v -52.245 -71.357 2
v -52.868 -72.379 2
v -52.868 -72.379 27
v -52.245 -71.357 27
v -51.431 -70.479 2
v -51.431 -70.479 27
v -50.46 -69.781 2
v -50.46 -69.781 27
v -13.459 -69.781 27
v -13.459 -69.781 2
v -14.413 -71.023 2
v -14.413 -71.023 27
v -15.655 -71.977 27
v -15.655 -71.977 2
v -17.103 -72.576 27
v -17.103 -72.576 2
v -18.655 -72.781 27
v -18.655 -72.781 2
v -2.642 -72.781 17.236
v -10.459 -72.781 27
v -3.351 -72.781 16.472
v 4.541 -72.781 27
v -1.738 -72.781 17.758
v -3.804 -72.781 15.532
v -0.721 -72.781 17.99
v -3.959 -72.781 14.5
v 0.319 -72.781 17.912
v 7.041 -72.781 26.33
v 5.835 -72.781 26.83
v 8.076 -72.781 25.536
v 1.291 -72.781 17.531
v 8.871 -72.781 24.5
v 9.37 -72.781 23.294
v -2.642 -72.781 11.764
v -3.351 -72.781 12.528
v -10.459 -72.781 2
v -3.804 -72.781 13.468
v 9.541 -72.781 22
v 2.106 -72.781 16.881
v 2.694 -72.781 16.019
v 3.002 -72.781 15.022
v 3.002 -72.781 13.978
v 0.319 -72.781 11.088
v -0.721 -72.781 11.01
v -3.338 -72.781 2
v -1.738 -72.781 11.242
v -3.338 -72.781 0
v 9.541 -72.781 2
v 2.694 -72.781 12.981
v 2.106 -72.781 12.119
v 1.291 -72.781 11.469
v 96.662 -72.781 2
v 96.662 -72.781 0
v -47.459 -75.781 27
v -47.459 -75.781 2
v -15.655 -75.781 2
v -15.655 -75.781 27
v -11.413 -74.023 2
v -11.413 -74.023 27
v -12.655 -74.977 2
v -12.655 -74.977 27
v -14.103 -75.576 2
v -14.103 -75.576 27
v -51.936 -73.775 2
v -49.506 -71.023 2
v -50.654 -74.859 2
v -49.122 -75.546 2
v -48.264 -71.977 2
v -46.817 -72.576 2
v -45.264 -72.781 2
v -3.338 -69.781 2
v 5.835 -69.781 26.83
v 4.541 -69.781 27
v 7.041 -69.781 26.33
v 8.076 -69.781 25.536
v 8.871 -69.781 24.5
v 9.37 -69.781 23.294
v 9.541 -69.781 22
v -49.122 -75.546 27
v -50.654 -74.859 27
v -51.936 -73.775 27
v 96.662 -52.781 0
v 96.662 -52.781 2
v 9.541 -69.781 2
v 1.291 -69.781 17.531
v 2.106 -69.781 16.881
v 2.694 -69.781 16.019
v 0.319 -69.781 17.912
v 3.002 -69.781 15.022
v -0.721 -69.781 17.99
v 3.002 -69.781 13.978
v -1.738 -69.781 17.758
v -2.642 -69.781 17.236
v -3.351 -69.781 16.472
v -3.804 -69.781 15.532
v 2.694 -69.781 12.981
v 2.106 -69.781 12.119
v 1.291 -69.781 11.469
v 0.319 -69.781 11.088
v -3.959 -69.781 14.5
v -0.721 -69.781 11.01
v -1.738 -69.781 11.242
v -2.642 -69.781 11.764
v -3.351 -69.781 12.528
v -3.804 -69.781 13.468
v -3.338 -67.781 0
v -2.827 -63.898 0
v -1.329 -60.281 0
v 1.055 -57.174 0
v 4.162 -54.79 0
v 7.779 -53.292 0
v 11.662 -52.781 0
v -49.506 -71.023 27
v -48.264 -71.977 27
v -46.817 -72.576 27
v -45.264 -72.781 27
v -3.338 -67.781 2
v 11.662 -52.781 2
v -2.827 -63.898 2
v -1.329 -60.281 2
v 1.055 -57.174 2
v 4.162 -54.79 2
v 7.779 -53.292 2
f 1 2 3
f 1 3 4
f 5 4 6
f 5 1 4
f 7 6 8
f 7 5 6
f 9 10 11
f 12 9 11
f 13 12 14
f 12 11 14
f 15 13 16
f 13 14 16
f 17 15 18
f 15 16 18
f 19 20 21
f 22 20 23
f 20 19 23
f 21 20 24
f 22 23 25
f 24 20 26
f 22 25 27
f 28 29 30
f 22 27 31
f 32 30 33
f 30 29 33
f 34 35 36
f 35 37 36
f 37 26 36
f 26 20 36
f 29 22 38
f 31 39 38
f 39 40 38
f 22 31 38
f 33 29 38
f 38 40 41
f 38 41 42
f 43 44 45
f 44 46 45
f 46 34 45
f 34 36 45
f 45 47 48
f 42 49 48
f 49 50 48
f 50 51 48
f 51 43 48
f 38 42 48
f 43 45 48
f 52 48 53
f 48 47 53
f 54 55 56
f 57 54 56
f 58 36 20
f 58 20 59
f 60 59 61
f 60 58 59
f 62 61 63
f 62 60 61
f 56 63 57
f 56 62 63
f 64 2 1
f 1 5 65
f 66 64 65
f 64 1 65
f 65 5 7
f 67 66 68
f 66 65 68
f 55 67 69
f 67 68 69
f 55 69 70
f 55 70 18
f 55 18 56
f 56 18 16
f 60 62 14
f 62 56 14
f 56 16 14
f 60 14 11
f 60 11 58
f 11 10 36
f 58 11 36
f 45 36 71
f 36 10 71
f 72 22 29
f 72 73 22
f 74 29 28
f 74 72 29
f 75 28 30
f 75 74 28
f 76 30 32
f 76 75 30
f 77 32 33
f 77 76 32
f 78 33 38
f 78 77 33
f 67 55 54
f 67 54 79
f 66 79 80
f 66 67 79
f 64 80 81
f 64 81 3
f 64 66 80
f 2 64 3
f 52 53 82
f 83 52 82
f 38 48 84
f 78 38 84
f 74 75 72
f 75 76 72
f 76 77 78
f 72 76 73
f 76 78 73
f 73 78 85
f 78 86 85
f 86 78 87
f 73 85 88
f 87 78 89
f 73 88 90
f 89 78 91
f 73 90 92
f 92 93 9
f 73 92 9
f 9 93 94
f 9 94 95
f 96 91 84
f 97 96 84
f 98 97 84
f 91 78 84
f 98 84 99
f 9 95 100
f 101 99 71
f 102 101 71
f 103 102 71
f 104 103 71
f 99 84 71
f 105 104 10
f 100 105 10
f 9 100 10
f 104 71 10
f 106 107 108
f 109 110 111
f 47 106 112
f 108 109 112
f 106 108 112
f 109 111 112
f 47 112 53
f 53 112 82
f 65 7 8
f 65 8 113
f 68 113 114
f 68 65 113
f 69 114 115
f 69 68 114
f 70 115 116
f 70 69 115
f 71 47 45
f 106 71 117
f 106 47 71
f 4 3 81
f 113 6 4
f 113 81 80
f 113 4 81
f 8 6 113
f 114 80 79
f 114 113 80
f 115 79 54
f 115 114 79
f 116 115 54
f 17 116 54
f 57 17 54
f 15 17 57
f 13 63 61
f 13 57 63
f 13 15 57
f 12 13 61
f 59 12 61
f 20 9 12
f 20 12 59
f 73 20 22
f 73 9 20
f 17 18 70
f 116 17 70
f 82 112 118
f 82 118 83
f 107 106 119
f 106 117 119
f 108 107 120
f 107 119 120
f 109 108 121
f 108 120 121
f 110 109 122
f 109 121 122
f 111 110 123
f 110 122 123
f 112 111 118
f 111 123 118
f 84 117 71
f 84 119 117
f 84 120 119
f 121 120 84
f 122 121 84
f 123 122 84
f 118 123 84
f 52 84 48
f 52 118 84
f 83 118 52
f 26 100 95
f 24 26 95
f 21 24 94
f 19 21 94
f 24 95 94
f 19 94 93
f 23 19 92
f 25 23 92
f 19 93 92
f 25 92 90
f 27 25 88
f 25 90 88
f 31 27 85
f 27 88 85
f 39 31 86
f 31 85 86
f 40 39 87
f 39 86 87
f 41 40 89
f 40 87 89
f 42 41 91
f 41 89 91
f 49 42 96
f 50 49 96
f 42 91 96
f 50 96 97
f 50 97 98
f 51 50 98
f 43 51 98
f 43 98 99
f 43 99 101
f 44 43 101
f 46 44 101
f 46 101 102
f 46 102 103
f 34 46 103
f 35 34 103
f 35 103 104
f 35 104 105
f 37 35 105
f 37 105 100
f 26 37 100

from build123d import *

# Parameters (mm, degrees)
F0_W        = 100
F0_H        = 20
F1_DEPTH    = 2
F2_R        = 15
F4_DEPTH    = 25
F5_T1_DEPTH = 25
F5_T3_DEPTH = 50.9807621135
F5_T5_DEPTH = 50.9793707428
F5_T7_DEPTH = 55
F6_R        = 5
F8_D        = 7


# Not quite as in the source:
# - a fillet or chamfer that OpenCascade refuses, or shapes differently, is made with other operations: its cross-section is extruded or revolved along the edge and cut away or added


with BuildPart() as f1:
    # F0 (on Top) → F1 (new body)
    with BuildSketch(Plane.XY):
        with Locations((46.6617465019, -62.7806016803)):
            Rectangle(F0_W, F0_H)
    extrude(amount=F1_DEPTH)

    # F2
    f2_edges = [f1.edges().sort_by_distance(p)[0] for p in [
        (-3.338253, -52.780602, 1),
    ]]
    fillet(f2_edges, radius=F2_R)

    # F3 (on face) → F4 (join)
    with BuildSketch(Plane.XY.offset(2)):
        Polygon((-10.4593388438, -72.7806016803), (9.5406611562, -72.7806016803), (9.5406611562, -69.7806016803), (-10.4593388438, -69.7806016803), (-13.4593388438, -69.7806016803), (-13.4593388438, -72.7806016803), (-50.4598207772, -72.7806016803), (-50.4598207772, -69.7806016803), (-53.4593388438, -69.7806016803), (-53.4593388438, -72.7806016803), (-53.4593388438, -75.7806016803), (-50.4598207772, -75.7806016803), (-13.4593388438, -75.7806016803), (-10.4593388438, -75.7806016803), align=None)
    extrude(amount=F4_DEPTH)

    # F5: fillet of radius 6 on 5 edges, made by hand

    # F5_s2 → F5_t1 (join)
    with BuildSketch(Plane.XY.offset(2)):
        with BuildLine():
            ThreePointArc((-13.4593388438, -69.7806016803), (-15.6554912665, -71.976754103), (-18.6554912665, -72.7806016803))
            Line((-18.6554912665, -72.7806016803), (-13.4593388438, -72.7806016803))
            Line((-13.4593388438, -72.7806016803), (-13.4593388438, -69.7806016803))
        make_face()
        with BuildLine():
            ThreePointArc((-50.4598207772, -69.7806016803), (-48.2636683545, -71.976754103), (-45.2636683545, -72.7806016803))
            Line((-45.2636683545, -72.7806016803), (-50.4598207772, -72.7806016803))
            Line((-50.4598207772, -72.7806016803), (-50.4598207772, -69.7806016803))
        make_face()
    extrude(amount=F5_T1_DEPTH)

    # F5_s4 → F5_t3 (cut)
    with BuildSketch(Plane.XY.offset(-10.9903810568)):
        with BuildLine():
            ThreePointArc((-10.4593388438, -72.7806016803), (-12.6554912665, -74.976754103), (-15.6554912665, -75.7806016803))
            Line((-15.6554912665, -75.7806016803), (-10.4593388438, -75.7806016803))
            Line((-10.4593388438, -75.7806016803), (-10.4593388438, -72.7806016803))
        make_face()
    extrude(amount=F5_T3_DEPTH, mode=Mode.SUBTRACT)

    # F5_s6 → F5_t5 (cut)
    with BuildSketch(Plane.XY.offset(-10.9896853714)):
        with BuildLine():
            ThreePointArc((-53.4593388438, -74.9764758288), (-52.6556303868, -71.9767168052), (-50.4598207772, -69.7806016803))
            Line((-50.4598207772, -69.7806016803), (-53.4593388438, -69.7806016803))
            Line((-53.4593388438, -69.7806016803), (-53.4593388438, -74.9764758288))
        make_face()
    extrude(amount=F5_T5_DEPTH, mode=Mode.SUBTRACT)

    # F5_s8 → F5_t7 (cut)
    with BuildSketch(Plane.XY.offset(-13)):
        with BuildLine():
            ThreePointArc((-47.4593388438, -75.7806016803), (-51.7019795309, -74.0232423674), (-53.4593388438, -69.7806016803))
            Line((-53.4593388438, -69.7806016803), (-53.4593388438, -75.7806016803))
            Line((-53.4593388438, -75.7806016803), (-47.4593388438, -75.7806016803))
        make_face()
    extrude(amount=F5_T7_DEPTH, mode=Mode.SUBTRACT)

    # F6
    f6_edges = [f1.edges().sort_by_distance(p)[0] for p in [
        (9.540661, -71.280602, 27),
    ]]
    fillet(f6_edges, radius=F6_R)

    # F8 (through all)
    with Locations(Plane.XZ.offset(72.7806016803)):
        with Locations((-0.4593388438, 14.5)):
            Hole(F8_D / 2)


solid = f1.part
